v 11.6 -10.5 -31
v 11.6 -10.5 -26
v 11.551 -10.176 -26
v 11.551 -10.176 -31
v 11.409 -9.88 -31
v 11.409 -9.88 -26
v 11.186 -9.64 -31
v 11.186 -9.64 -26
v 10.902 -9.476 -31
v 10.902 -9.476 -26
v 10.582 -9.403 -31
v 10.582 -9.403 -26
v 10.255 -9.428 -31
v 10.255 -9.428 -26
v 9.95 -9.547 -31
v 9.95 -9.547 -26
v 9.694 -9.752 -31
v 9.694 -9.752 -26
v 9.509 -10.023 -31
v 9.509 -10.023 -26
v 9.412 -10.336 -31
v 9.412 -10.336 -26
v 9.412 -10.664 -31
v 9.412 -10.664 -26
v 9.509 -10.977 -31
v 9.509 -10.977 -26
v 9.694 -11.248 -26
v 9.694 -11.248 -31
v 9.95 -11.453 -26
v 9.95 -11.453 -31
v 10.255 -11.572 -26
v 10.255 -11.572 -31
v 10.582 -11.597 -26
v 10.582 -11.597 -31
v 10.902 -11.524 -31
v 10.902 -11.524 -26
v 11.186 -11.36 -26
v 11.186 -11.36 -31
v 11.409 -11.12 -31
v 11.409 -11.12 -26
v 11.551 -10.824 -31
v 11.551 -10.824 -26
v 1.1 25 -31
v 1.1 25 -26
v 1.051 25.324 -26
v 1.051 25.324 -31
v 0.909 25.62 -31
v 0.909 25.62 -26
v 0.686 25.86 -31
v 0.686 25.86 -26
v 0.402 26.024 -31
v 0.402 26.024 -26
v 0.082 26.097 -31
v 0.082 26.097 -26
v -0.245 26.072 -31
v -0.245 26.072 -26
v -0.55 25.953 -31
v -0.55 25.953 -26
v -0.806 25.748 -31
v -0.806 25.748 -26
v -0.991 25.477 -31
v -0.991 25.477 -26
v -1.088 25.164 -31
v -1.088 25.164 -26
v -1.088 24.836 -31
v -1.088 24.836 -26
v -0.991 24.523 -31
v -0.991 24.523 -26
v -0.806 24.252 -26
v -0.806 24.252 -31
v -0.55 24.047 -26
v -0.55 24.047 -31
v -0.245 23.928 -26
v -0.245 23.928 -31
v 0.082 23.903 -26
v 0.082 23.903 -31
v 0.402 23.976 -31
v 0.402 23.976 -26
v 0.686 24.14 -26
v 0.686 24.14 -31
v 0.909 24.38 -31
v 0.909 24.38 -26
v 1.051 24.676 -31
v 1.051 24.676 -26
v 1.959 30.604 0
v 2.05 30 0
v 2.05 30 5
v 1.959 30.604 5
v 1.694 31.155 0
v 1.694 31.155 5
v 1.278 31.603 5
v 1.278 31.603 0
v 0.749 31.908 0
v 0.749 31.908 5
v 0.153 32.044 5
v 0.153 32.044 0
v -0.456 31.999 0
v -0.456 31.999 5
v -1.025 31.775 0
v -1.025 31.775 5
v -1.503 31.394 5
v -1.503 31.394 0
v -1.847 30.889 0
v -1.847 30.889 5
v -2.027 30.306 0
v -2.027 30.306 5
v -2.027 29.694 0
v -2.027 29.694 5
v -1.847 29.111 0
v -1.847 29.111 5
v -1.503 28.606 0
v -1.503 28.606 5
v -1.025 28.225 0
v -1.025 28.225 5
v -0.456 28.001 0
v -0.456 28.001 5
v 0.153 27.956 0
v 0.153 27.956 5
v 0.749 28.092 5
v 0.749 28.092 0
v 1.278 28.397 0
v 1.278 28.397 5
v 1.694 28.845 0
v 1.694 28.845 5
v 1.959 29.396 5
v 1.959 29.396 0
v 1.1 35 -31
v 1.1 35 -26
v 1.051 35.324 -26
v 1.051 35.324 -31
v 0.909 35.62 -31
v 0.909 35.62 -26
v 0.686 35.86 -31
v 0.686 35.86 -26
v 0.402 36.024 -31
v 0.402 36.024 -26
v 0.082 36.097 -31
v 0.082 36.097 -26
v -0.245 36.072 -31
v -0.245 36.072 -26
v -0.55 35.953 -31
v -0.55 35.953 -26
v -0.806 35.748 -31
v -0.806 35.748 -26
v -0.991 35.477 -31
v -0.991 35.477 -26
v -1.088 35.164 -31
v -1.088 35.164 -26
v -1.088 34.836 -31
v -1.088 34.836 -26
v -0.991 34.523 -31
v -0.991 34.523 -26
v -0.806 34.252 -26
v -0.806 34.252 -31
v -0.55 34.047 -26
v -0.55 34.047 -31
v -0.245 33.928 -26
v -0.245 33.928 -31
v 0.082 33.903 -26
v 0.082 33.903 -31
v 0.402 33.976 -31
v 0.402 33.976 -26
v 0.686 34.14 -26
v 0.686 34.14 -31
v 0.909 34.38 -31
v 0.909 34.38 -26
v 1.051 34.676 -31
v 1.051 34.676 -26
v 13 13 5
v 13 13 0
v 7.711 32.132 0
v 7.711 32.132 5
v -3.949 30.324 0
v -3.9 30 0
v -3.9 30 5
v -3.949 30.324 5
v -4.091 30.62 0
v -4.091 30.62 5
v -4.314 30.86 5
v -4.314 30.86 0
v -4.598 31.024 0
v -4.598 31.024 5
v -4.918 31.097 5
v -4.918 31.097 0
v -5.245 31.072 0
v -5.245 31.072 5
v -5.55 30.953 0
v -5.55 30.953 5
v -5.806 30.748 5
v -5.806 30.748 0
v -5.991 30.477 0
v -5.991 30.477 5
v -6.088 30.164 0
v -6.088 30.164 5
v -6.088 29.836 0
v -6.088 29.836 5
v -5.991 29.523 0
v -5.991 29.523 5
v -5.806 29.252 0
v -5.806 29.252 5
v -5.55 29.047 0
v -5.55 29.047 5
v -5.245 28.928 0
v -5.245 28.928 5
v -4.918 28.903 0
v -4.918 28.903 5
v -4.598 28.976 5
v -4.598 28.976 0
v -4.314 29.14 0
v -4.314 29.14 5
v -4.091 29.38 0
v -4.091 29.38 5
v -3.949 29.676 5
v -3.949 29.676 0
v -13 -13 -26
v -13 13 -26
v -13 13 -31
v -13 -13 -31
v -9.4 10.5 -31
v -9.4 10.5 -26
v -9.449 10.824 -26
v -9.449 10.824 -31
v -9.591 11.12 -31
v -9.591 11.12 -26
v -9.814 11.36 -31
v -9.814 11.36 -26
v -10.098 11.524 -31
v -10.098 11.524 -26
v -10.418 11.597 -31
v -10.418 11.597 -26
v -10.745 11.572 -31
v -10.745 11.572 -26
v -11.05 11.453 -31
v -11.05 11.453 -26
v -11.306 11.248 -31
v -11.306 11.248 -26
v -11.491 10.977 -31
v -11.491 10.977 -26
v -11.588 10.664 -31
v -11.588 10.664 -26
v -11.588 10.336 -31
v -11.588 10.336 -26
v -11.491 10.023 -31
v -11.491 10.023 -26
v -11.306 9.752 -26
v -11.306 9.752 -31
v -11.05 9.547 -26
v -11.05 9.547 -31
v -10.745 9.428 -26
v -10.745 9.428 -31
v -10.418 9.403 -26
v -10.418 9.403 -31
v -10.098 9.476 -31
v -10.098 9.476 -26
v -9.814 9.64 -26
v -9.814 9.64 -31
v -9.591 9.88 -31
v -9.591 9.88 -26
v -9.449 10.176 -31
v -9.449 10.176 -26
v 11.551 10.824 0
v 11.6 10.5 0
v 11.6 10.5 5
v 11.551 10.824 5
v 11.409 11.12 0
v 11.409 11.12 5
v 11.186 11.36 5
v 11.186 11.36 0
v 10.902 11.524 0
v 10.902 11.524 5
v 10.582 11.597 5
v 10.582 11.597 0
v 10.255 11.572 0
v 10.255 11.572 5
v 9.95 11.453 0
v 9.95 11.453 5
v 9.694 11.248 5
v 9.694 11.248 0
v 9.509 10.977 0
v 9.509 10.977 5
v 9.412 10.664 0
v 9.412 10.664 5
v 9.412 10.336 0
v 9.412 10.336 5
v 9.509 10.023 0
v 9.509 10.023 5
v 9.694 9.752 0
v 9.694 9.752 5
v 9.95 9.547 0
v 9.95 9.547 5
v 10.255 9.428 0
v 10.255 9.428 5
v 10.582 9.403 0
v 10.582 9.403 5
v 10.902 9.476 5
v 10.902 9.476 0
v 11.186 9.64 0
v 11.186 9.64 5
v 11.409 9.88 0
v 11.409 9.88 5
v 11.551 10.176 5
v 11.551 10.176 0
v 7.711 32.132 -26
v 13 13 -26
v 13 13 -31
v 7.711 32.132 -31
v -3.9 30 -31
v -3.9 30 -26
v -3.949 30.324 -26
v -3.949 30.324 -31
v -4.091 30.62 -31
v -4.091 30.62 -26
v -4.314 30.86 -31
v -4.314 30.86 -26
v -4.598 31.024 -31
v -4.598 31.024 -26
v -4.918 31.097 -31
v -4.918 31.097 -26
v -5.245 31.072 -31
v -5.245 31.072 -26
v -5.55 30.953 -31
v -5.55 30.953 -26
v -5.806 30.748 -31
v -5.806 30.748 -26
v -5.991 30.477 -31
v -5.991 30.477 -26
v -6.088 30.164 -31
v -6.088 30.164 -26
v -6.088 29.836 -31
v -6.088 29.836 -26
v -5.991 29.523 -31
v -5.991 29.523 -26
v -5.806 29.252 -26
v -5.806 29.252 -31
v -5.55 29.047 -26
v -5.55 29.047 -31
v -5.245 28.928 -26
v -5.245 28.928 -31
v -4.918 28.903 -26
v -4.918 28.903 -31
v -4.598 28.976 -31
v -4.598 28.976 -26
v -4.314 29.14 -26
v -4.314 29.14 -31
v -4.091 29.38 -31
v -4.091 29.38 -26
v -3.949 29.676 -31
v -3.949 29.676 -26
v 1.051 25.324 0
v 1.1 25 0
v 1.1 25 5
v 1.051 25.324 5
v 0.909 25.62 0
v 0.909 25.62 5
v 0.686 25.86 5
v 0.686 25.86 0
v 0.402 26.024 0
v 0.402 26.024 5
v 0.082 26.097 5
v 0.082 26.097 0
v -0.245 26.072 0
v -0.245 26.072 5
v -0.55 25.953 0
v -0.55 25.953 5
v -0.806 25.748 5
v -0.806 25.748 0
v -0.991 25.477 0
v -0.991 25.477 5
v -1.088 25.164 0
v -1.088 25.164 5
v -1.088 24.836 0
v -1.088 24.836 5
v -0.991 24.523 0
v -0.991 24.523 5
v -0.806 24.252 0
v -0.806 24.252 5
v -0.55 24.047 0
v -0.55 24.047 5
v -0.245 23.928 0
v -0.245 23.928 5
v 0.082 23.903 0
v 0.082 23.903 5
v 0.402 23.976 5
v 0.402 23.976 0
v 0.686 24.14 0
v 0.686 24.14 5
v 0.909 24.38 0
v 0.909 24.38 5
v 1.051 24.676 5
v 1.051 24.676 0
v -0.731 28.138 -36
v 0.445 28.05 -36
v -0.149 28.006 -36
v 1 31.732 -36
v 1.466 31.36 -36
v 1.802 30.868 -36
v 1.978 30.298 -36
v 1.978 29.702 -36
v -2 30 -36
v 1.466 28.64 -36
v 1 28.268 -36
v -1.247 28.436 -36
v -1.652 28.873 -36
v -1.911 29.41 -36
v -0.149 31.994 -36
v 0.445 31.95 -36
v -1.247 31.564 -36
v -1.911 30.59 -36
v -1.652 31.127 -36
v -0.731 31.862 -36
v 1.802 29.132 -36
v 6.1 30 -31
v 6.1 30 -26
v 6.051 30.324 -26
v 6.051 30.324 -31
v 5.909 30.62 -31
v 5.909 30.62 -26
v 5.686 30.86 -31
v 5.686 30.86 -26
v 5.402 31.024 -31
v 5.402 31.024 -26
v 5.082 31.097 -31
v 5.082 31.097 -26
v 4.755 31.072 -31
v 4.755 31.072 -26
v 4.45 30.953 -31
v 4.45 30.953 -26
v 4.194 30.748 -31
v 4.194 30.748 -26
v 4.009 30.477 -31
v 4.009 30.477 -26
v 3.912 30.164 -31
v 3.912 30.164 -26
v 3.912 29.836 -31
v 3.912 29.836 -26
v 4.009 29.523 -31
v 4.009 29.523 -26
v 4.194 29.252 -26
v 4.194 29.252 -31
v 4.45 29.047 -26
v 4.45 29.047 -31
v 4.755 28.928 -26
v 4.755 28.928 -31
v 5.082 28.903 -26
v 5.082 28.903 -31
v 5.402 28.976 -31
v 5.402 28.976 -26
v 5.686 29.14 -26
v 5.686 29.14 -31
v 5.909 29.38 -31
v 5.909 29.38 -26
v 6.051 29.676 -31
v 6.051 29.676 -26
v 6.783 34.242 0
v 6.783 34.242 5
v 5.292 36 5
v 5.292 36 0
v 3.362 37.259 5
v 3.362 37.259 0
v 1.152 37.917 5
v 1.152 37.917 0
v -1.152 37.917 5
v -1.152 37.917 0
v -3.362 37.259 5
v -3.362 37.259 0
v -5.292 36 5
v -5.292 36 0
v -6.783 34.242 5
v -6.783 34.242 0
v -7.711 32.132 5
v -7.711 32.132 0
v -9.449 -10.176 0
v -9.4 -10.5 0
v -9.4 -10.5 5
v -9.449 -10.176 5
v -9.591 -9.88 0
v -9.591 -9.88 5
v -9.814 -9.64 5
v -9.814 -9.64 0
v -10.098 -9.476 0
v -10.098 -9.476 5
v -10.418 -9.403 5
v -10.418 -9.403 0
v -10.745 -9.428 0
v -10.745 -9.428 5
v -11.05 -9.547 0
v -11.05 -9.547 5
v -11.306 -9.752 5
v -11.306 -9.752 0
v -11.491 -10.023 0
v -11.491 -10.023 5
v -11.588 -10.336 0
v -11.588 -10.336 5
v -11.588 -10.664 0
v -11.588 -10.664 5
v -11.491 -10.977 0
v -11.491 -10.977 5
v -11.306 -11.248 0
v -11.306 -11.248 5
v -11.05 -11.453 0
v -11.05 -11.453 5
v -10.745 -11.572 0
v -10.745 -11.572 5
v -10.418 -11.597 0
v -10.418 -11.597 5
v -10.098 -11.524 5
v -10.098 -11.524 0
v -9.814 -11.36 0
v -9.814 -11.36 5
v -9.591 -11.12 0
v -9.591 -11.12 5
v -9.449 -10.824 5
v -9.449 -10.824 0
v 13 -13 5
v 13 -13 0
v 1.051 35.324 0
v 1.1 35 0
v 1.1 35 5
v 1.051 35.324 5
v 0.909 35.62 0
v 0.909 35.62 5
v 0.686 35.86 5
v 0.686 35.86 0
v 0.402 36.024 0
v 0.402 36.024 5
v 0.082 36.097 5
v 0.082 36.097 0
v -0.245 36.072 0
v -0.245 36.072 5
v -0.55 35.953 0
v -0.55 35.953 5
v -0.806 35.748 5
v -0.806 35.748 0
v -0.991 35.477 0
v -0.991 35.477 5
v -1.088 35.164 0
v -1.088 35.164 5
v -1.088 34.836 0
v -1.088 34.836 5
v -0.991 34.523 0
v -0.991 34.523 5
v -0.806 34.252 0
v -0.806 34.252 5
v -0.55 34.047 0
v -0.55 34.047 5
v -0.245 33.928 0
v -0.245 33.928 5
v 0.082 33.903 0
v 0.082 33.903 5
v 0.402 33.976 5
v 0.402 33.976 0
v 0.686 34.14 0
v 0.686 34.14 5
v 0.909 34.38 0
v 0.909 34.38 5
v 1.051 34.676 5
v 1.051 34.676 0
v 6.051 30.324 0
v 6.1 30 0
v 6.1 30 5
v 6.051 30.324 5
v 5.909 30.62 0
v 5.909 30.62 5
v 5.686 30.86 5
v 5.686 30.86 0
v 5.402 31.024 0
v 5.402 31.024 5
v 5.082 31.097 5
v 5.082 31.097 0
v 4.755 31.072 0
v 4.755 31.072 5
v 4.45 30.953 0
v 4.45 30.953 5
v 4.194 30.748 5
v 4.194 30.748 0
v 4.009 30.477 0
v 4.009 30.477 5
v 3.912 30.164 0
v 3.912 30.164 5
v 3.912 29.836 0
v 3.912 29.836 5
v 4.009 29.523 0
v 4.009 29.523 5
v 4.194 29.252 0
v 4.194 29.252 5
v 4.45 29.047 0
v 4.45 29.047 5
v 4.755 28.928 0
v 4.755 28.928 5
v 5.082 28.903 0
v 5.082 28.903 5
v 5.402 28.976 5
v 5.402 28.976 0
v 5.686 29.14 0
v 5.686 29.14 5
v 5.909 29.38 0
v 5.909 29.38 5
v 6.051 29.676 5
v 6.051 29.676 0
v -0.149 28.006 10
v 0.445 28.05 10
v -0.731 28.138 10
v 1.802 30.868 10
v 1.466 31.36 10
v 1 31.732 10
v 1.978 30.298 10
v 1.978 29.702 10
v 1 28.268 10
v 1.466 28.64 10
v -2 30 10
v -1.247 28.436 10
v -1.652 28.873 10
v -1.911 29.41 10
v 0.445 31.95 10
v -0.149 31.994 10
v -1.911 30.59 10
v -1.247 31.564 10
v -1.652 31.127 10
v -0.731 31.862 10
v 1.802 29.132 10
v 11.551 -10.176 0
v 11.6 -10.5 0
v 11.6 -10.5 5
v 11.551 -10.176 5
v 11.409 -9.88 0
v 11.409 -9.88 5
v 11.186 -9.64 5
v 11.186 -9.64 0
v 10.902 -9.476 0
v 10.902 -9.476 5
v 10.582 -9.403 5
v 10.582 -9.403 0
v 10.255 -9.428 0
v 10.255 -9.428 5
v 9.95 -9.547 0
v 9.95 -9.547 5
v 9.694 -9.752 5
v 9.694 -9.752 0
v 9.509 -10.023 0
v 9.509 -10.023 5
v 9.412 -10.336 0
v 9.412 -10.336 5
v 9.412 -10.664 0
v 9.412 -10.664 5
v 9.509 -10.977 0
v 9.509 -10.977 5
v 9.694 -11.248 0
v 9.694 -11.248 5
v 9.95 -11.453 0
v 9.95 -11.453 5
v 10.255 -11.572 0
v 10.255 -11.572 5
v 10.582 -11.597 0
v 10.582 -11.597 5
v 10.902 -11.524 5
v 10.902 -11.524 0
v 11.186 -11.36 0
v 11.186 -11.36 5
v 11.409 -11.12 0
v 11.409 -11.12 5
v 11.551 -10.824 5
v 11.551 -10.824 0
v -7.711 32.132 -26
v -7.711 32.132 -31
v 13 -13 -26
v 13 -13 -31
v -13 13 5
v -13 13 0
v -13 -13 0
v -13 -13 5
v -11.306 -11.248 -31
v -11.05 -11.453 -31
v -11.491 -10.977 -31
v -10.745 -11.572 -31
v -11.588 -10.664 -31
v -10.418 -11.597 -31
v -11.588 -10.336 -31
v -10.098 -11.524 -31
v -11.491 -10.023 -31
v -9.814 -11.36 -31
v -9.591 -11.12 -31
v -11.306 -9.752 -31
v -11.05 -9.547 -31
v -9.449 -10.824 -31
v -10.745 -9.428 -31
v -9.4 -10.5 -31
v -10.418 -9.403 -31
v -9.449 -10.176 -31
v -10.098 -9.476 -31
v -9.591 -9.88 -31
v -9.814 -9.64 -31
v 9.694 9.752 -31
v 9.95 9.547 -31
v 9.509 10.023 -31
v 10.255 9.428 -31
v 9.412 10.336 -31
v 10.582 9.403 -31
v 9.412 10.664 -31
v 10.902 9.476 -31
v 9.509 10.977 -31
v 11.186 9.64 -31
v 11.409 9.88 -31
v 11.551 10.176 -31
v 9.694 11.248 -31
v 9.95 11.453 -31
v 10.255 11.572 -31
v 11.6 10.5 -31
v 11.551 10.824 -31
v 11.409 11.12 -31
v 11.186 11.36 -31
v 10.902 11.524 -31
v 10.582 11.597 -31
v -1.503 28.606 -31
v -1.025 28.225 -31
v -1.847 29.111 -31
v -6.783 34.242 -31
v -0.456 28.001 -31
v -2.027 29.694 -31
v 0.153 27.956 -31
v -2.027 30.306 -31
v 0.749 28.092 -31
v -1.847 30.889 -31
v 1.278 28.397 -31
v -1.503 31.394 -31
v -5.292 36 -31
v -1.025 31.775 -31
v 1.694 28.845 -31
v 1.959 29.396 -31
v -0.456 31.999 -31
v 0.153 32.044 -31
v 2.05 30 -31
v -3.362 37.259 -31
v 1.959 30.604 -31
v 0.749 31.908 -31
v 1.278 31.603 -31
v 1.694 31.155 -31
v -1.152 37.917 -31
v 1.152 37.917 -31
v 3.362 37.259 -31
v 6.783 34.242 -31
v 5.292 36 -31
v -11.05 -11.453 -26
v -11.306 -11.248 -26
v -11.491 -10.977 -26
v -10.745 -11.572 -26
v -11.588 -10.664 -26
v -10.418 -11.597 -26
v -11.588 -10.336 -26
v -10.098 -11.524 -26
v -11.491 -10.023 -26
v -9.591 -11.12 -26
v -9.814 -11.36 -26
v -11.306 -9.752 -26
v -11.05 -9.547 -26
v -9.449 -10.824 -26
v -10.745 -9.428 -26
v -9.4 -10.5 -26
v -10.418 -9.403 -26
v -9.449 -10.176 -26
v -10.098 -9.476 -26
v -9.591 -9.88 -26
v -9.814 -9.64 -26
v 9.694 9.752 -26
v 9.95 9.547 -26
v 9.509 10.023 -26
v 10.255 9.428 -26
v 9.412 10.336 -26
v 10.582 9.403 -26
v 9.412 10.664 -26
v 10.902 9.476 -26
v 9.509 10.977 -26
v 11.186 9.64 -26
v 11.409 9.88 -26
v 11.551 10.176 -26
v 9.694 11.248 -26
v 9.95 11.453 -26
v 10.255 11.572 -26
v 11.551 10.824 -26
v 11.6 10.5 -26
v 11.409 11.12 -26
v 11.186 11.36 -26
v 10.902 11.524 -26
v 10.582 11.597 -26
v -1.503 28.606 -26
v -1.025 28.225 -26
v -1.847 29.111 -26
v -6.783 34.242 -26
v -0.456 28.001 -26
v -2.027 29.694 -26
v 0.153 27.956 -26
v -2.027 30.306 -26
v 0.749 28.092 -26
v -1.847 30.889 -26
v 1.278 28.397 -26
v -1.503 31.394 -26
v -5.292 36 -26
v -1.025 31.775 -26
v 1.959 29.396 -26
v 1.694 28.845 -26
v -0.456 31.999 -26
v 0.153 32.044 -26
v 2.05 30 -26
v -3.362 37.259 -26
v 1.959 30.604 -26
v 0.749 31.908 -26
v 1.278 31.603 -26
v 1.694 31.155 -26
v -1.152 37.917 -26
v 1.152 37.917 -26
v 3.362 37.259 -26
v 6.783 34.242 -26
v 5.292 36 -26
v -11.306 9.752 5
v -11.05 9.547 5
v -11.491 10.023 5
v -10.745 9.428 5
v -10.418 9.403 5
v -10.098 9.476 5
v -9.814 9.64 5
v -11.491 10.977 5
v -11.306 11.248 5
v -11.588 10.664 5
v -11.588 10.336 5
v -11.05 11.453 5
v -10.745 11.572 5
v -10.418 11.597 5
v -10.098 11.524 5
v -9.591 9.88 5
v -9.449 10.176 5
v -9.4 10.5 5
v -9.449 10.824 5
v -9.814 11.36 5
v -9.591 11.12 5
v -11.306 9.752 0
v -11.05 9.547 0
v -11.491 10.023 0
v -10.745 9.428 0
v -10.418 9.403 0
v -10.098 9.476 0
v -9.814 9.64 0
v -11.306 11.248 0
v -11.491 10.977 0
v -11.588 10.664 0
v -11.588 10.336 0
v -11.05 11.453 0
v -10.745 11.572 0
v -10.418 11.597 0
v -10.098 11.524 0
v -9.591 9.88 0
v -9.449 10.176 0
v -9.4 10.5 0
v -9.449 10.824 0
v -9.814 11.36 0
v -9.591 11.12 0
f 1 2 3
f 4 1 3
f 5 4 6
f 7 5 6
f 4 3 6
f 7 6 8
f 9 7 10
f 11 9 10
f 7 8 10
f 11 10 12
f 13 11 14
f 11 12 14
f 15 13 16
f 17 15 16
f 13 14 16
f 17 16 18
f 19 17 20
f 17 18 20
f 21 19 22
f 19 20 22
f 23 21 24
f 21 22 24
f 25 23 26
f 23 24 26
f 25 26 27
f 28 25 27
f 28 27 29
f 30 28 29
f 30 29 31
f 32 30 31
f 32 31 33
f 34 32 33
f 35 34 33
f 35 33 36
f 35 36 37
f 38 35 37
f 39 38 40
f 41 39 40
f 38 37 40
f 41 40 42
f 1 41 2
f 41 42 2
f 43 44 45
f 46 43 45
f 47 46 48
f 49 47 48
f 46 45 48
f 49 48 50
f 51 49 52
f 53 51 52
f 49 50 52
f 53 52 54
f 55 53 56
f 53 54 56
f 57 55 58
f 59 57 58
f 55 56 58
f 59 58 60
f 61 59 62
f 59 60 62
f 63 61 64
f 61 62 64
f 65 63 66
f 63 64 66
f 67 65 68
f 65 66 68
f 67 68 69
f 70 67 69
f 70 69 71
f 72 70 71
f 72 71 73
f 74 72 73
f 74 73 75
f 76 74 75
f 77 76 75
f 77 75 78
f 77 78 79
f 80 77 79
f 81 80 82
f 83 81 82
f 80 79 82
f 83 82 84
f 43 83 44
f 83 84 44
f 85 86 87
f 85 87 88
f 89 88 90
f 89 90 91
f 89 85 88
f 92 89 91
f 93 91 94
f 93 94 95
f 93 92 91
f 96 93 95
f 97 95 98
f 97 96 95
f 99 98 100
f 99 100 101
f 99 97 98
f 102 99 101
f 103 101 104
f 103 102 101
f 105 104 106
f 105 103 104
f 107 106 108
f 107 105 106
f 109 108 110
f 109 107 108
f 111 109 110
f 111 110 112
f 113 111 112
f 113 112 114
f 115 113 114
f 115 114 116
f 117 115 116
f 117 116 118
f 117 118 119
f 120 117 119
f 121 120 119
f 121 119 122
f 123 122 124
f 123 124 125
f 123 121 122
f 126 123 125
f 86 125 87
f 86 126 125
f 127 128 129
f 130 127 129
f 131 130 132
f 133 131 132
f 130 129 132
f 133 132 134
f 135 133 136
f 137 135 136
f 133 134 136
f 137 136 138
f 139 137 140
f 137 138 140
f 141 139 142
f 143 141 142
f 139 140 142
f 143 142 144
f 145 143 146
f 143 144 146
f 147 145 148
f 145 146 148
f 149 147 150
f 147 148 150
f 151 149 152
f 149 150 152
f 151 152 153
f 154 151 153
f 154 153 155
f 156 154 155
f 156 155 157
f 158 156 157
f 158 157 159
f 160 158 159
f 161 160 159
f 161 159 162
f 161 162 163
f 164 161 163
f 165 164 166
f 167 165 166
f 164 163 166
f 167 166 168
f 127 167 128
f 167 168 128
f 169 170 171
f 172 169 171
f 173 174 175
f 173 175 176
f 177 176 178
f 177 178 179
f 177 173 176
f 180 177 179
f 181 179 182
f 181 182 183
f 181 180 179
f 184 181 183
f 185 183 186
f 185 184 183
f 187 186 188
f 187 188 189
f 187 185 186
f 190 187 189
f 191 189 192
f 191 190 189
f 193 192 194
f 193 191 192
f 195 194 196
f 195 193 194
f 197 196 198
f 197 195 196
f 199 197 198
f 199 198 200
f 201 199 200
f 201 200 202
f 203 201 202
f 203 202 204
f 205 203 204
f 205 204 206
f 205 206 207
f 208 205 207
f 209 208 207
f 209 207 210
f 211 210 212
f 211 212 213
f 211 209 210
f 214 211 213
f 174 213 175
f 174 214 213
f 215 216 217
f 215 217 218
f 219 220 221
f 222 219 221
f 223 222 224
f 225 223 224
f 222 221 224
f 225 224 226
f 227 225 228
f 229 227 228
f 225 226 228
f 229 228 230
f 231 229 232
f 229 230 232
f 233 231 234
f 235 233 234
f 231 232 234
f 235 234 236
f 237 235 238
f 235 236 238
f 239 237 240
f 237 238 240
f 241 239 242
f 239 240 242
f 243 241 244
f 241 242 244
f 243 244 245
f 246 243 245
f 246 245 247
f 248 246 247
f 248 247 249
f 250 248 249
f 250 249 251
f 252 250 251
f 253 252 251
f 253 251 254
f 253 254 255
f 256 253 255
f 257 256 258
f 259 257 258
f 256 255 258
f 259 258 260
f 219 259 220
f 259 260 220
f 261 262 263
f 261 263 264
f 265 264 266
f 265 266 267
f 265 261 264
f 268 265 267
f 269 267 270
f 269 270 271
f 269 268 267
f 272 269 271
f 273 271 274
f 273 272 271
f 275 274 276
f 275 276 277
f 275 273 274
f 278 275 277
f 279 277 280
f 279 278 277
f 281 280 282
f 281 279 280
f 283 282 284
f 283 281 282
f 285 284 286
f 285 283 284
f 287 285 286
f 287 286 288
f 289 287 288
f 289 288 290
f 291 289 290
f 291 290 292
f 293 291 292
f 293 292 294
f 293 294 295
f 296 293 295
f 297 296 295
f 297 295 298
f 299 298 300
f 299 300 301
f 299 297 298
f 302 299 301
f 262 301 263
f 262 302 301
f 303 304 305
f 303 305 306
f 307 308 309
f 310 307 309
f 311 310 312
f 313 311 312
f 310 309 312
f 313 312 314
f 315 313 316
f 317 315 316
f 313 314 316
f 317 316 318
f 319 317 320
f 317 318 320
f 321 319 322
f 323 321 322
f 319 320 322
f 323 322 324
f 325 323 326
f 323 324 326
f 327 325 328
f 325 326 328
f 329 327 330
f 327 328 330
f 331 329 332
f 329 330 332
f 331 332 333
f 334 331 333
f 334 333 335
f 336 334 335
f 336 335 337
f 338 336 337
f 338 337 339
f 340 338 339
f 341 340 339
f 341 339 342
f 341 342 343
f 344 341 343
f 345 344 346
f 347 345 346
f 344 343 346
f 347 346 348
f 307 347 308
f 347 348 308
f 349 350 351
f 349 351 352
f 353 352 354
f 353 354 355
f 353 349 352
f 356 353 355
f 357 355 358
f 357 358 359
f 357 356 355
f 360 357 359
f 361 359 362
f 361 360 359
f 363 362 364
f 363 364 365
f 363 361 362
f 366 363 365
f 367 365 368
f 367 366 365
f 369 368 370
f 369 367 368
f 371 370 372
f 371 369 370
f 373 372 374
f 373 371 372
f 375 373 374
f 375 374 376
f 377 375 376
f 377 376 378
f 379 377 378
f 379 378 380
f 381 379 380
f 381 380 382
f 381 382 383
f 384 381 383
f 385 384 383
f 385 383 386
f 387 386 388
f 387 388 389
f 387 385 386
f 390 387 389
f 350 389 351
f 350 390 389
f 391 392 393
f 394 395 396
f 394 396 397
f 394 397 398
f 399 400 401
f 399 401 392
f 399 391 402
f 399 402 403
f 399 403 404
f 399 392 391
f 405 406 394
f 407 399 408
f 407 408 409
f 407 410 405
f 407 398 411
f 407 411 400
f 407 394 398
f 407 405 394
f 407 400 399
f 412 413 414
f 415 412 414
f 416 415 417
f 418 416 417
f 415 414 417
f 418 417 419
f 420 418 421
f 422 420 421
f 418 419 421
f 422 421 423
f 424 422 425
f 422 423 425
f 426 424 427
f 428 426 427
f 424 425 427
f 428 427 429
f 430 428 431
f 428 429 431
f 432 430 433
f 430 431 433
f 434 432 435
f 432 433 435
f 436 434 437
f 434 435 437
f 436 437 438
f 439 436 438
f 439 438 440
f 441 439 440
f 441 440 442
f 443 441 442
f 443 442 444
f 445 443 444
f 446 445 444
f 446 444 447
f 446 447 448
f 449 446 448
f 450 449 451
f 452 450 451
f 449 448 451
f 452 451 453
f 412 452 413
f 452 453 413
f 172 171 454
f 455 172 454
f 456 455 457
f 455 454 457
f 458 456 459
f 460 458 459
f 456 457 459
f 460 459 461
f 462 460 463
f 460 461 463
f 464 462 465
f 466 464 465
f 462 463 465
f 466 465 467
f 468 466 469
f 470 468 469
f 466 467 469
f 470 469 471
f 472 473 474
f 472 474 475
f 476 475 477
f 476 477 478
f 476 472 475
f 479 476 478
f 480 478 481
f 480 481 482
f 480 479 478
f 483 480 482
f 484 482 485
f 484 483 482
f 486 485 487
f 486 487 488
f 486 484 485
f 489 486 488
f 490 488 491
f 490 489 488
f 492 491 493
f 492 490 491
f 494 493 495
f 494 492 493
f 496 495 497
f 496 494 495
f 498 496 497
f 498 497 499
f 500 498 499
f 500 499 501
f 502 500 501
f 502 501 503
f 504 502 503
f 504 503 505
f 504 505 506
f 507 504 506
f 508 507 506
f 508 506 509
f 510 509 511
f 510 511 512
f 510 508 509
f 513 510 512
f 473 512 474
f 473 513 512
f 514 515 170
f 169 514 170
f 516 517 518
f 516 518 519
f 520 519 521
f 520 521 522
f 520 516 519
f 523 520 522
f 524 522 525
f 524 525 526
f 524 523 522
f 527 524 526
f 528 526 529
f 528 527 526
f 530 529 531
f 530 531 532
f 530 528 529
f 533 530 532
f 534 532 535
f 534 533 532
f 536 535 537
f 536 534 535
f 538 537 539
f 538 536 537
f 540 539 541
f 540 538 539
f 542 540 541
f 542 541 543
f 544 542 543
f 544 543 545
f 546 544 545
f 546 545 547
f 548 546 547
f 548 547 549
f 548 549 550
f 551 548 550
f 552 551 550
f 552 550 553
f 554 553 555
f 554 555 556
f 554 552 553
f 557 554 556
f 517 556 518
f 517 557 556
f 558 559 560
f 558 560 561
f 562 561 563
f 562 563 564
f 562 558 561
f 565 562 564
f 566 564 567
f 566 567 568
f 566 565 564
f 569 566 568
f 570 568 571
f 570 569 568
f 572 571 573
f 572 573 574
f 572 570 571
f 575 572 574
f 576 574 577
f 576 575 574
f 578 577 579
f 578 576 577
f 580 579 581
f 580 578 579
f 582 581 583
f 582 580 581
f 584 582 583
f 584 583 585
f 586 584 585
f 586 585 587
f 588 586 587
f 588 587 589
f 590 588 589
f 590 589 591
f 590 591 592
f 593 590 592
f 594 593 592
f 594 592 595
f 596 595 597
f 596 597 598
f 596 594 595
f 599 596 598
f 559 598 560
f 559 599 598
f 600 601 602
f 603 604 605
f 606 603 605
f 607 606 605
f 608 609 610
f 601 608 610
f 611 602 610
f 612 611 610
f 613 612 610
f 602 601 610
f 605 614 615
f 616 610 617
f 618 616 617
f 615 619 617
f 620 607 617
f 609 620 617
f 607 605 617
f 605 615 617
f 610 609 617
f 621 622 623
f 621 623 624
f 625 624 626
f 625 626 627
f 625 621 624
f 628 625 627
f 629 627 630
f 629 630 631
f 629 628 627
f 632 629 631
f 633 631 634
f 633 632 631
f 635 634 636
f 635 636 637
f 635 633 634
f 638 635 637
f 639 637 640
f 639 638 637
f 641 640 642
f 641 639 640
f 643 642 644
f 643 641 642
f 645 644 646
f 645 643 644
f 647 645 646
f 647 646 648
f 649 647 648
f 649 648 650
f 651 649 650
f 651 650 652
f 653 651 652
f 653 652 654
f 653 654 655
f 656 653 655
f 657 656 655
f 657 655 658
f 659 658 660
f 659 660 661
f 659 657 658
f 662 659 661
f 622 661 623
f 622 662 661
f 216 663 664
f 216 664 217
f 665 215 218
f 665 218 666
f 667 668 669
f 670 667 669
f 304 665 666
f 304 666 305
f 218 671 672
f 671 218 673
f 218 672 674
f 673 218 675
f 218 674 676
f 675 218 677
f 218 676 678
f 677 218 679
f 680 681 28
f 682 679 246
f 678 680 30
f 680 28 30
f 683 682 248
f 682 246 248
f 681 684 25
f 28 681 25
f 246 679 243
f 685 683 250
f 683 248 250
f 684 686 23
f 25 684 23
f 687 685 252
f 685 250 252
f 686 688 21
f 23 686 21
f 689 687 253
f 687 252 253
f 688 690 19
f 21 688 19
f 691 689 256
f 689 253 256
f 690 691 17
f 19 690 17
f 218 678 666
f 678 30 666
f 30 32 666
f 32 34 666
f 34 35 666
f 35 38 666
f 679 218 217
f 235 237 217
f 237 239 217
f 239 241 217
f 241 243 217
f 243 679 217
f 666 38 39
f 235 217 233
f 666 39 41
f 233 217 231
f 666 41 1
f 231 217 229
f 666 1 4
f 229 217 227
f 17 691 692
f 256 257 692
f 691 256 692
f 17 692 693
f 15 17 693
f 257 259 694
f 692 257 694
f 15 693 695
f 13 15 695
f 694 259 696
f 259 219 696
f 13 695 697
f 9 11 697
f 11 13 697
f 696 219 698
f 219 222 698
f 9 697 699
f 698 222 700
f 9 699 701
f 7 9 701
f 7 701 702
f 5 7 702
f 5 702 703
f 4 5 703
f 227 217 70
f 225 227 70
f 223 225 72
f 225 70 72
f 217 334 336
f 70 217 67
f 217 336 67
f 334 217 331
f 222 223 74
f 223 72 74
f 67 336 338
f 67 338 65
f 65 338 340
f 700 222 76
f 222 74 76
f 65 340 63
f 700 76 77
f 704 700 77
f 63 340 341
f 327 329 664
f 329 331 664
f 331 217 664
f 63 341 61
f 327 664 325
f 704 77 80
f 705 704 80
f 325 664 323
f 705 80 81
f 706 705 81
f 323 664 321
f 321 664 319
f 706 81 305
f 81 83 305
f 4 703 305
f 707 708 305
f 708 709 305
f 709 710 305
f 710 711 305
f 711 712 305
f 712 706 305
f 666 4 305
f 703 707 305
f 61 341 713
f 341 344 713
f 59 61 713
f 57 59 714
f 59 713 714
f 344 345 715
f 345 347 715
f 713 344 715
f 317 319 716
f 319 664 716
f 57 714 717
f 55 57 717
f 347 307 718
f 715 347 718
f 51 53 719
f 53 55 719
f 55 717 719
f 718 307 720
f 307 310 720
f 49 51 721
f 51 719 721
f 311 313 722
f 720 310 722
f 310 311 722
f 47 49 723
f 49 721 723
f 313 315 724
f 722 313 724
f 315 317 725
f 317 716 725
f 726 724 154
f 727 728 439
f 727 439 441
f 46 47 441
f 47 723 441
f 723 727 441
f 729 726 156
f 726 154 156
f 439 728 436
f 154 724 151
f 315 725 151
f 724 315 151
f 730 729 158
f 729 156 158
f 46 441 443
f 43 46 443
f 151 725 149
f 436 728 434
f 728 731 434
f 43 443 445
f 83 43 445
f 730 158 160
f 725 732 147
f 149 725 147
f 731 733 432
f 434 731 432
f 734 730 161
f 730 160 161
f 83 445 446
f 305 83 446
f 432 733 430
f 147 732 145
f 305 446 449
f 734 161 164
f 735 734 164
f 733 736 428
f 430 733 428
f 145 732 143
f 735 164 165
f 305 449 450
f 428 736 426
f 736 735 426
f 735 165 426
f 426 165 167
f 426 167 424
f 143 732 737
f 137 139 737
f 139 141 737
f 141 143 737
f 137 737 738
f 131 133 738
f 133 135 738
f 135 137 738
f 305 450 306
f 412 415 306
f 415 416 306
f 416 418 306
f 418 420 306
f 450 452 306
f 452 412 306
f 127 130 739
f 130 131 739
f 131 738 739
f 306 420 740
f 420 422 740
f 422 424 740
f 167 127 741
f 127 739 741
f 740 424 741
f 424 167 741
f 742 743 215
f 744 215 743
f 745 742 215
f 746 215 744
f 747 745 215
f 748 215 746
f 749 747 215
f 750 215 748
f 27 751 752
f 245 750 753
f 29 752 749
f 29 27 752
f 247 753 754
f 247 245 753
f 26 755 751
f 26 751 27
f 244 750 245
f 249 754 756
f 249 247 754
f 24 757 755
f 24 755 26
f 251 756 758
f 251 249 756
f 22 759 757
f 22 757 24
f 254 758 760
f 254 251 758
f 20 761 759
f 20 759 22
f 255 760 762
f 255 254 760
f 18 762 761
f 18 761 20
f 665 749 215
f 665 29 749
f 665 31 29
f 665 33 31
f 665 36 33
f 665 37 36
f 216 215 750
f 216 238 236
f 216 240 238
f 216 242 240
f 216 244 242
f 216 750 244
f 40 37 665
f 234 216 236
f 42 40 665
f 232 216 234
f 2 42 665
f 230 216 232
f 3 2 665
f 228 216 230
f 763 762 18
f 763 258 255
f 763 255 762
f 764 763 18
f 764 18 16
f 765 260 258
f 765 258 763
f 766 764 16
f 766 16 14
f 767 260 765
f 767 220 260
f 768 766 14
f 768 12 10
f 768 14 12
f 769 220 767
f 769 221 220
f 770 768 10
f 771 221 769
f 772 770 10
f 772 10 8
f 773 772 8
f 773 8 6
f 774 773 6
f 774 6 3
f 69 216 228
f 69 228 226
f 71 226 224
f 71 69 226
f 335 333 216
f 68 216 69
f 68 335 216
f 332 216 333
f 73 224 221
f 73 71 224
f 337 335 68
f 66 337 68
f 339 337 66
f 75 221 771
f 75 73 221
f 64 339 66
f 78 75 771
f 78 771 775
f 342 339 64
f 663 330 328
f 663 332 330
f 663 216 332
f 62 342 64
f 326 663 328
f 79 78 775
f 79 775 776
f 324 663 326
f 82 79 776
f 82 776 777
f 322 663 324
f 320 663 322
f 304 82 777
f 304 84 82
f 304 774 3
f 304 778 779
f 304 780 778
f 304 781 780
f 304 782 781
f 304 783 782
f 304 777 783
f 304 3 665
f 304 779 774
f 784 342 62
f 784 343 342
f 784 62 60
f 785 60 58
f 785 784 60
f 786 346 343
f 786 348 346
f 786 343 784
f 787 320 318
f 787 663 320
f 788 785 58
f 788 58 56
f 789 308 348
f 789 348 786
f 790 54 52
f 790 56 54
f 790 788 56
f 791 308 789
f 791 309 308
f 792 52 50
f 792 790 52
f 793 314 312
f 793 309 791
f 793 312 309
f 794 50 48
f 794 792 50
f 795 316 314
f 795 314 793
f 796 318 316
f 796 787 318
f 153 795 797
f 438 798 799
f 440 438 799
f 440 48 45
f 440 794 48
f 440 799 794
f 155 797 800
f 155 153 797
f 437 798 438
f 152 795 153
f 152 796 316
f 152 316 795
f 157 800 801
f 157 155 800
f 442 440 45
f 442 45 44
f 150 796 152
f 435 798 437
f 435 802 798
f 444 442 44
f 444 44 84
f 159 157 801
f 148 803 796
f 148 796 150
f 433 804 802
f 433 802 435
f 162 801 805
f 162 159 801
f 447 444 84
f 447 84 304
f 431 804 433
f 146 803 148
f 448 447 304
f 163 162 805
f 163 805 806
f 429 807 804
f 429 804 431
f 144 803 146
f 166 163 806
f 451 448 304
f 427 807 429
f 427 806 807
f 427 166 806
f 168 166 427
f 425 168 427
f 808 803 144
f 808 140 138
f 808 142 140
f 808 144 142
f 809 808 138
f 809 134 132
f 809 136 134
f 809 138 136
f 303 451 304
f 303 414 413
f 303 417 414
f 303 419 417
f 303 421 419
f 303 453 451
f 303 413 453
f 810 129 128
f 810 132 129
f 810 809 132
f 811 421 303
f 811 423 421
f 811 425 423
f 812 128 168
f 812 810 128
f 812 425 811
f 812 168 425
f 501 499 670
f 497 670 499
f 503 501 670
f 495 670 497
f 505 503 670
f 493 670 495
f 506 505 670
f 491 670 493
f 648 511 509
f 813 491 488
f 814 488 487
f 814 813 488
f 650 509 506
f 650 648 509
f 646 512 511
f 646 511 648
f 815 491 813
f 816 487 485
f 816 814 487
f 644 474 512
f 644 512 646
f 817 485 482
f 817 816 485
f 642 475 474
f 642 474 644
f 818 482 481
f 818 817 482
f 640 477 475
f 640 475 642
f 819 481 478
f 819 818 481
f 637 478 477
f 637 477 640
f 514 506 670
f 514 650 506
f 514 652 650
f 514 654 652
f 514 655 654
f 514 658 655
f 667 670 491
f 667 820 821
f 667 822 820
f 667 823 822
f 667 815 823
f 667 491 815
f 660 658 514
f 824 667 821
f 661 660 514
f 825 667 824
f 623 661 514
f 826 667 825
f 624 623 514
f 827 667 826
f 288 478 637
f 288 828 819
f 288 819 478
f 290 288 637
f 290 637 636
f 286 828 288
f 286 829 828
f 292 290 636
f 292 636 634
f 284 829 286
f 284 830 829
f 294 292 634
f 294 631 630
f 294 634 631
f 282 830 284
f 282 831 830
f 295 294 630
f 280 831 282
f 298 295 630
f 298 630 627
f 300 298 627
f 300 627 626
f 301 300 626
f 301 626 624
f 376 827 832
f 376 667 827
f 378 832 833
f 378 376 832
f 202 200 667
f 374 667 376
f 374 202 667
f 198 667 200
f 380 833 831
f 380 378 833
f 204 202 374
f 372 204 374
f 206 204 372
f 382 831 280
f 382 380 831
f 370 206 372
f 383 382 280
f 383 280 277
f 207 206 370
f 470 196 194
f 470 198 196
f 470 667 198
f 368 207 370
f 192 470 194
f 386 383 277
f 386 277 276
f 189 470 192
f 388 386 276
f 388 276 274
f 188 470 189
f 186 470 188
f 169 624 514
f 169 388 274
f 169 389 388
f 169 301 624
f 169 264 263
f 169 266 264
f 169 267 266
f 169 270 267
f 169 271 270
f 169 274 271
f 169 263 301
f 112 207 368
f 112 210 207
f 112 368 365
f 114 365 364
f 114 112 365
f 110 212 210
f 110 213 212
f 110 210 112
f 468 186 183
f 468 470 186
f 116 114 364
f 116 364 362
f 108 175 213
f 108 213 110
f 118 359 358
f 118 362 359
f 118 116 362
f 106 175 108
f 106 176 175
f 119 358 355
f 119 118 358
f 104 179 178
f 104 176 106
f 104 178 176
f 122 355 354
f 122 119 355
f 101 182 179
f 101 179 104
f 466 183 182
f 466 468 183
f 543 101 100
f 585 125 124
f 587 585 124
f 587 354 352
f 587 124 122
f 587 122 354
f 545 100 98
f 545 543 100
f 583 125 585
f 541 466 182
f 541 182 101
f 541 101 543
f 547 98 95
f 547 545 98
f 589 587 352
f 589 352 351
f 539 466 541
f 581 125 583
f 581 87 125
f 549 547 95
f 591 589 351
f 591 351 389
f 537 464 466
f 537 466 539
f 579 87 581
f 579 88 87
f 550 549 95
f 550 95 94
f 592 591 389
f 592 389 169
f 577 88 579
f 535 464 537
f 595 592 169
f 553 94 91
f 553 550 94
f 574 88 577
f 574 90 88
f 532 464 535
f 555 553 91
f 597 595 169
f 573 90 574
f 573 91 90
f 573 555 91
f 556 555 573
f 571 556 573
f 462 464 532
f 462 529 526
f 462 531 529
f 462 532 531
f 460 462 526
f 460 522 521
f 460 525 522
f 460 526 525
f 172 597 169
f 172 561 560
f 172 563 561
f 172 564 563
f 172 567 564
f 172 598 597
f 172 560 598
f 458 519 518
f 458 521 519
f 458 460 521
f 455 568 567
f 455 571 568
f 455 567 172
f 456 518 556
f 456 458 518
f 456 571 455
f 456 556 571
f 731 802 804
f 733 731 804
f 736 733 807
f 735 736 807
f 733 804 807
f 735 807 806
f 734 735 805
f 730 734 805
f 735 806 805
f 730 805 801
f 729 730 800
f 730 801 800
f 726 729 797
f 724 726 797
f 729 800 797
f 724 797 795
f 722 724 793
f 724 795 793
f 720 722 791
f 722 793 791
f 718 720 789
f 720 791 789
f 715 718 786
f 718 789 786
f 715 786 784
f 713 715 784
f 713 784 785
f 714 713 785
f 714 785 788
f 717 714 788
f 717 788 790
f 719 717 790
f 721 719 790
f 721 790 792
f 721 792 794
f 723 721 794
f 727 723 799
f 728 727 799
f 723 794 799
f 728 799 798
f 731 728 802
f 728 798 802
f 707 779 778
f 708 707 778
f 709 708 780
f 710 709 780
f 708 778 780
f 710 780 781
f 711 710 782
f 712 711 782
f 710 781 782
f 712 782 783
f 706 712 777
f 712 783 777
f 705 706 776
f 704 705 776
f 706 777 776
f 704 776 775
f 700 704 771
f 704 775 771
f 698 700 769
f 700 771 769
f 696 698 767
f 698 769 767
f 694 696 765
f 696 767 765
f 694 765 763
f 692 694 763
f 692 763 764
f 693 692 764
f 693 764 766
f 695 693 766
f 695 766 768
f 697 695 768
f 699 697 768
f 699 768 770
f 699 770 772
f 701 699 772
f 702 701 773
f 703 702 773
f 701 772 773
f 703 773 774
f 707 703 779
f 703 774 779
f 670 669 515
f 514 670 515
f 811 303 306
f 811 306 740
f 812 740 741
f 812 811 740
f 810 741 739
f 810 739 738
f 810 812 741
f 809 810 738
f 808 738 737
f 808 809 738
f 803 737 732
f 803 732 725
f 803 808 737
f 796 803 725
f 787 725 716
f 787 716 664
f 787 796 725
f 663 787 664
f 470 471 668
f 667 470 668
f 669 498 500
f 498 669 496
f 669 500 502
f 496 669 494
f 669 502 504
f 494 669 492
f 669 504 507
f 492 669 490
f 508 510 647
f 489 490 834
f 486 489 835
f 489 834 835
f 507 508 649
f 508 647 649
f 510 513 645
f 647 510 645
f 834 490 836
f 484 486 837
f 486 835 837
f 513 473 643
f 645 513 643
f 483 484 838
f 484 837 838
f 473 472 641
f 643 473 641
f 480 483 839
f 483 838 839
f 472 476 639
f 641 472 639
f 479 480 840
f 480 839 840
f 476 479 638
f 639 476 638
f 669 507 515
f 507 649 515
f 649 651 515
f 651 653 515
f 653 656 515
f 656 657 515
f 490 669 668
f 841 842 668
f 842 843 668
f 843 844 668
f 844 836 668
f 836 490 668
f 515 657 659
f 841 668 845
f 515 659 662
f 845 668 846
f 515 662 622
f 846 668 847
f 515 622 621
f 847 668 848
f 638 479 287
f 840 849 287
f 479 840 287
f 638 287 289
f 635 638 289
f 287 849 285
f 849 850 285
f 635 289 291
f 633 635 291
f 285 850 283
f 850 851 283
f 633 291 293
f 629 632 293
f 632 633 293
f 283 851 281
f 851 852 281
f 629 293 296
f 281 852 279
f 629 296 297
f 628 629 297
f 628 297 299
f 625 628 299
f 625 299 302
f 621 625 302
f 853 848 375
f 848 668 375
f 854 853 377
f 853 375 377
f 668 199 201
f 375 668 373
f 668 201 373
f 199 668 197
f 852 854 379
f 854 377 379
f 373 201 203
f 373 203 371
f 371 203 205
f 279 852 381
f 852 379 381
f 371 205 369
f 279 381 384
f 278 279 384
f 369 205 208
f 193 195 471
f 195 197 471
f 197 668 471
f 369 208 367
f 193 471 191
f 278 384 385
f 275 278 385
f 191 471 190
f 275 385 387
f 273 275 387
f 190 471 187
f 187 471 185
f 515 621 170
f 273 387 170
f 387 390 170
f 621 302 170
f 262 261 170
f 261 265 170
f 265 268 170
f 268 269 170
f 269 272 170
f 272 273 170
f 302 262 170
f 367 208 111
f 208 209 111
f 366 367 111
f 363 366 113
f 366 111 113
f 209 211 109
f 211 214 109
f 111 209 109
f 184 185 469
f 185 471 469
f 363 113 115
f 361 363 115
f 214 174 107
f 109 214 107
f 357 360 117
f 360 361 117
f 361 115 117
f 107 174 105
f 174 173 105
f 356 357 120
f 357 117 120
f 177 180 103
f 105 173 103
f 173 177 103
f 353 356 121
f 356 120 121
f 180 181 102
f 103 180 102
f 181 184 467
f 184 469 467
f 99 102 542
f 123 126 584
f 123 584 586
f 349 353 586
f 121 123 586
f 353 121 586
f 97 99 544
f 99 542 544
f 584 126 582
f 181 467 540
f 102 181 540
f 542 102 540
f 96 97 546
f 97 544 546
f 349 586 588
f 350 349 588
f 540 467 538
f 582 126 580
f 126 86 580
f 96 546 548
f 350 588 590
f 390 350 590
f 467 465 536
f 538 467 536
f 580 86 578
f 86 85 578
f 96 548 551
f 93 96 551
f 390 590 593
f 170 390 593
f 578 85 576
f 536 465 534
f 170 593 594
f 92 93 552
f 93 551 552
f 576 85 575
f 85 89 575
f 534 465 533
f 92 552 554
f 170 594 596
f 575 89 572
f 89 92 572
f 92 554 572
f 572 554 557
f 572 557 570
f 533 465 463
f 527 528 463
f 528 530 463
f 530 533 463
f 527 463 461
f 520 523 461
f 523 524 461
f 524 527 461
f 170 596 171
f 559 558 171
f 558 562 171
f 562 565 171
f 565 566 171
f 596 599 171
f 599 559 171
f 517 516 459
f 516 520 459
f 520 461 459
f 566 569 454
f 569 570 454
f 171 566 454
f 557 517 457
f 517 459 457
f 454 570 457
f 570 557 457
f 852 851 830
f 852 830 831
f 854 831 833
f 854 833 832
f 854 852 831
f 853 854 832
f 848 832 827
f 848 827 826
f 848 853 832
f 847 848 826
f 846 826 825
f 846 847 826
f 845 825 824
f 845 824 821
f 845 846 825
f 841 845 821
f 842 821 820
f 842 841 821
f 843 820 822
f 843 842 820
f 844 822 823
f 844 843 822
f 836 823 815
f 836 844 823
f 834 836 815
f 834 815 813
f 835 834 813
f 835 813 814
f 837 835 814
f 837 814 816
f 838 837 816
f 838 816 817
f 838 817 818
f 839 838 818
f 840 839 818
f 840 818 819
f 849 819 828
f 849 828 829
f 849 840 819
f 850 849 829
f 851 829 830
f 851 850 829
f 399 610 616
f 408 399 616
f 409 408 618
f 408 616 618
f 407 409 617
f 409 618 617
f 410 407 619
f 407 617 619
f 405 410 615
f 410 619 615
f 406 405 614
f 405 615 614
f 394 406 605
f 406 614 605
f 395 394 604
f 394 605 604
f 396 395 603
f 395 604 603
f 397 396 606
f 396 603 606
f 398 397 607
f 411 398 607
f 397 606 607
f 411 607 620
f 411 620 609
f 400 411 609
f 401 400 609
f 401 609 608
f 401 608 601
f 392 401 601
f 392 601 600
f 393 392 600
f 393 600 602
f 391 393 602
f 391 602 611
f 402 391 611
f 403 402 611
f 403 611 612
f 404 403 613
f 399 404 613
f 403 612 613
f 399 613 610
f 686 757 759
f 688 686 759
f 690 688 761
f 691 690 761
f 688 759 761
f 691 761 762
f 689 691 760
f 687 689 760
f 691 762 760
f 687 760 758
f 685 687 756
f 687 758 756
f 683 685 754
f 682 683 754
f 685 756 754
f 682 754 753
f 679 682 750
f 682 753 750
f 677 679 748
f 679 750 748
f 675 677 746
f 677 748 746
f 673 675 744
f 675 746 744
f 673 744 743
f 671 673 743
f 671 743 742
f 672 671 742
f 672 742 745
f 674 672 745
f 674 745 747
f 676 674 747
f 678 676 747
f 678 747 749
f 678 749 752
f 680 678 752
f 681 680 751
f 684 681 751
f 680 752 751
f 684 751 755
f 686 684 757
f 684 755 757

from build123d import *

# Parameters (mm, degrees)
SKETCH_1_R           = 1.1
SKETCH_1_R_2         = 2.05
EXTRUDE_1_DEPTH      = 5
SKETCH_4_R           = 1.1
SKETCH_4_R_2         = 2.05
EXTRUDE_2_DEPTH      = 5
EXTRUDE_3_DEPTH      = 5
EXTRUDE_3_DEPTH_BACK = 41
SKETCH_6_R           = 2


with BuildPart() as part:
    # ｽｹｯﾁ1 → ﾎﾞｽ - 押し出し1 (new body)
    with BuildSketch(Plane.XY):
        with BuildLine():
            Line((-13, -13), (13, -13))
            Line((13, -13), (13, 13))
            Line((13, 13), (7.710748735, 32.131749033))
            ThreePointArc((7.710748735, 32.131749033), (0, 38), (-7.710748735, 32.131749033))
            Line((-7.710748735, 32.131749033), (-13, 13))
            Line((-13, 13), (-13, -13))
        make_face()
        with Locations((-10.5, 10.5)):
            Circle(SKETCH_1_R, mode=Mode.SUBTRACT)
        with Locations((10.5, 10.5)):
            Circle(SKETCH_1_R, mode=Mode.SUBTRACT)
        with Locations((10.5, -10.5)):
            Circle(SKETCH_1_R, mode=Mode.SUBTRACT)
        with Locations((-10.5, -10.5)):
            Circle(SKETCH_1_R, mode=Mode.SUBTRACT)
        with Locations((0, 30)):
            Circle(SKETCH_1_R_2, mode=Mode.SUBTRACT)
        with Locations((0, 35)):
            Circle(SKETCH_1_R, mode=Mode.SUBTRACT)
        with Locations((5, 30)):
            Circle(SKETCH_1_R, mode=Mode.SUBTRACT)
        with Locations((0, 25)):
            Circle(SKETCH_1_R, mode=Mode.SUBTRACT)
        with Locations((-5, 30)):
            Circle(SKETCH_1_R, mode=Mode.SUBTRACT)
    extrude(amount=EXTRUDE_1_DEPTH)


with BuildPart() as body_2:
    # ｽｹｯﾁ4 → ﾎﾞｽ - 押し出し2 (new body)
    with BuildSketch(Plane.XY.offset(-26)):
        with BuildLine():
            Line((-13, 13), (-13, -13))
            Line((-13, -13), (13, -13))
            Line((13, -13), (13, 13))
            Line((13, 13), (7.710748735, 32.131749033))
            ThreePointArc((7.710748735, 32.131749033), (0, 38), (-7.710748735, 32.131749033))
            Line((-7.710748735, 32.131749033), (-13, 13))
        make_face()
        with Locations((-10.5, 10.5)):
            Circle(SKETCH_4_R, mode=Mode.SUBTRACT)
        with Locations((10.5, 10.5)):
            Circle(SKETCH_4_R, mode=Mode.SUBTRACT)
        with Locations((10.5, -10.5)):
            Circle(SKETCH_4_R, mode=Mode.SUBTRACT)
        with Locations((-10.5, -10.5)):
            Circle(SKETCH_4_R, mode=Mode.SUBTRACT)
        with Locations((0, 30)):
            Circle(SKETCH_4_R_2, mode=Mode.SUBTRACT)
        with Locations((0, 35)):
            Circle(SKETCH_4_R, mode=Mode.SUBTRACT)
        with Locations((5, 30)):
            Circle(SKETCH_4_R, mode=Mode.SUBTRACT)
        with Locations((0, 25)):
            Circle(SKETCH_4_R, mode=Mode.SUBTRACT)
        with Locations((-5, 30)):
            Circle(SKETCH_4_R, mode=Mode.SUBTRACT)
    extrude(amount=-EXTRUDE_2_DEPTH)


with BuildPart() as body_3:
    # ｽｹｯﾁ6 → ﾎﾞｽ - 押し出し3 (new, two sides: drawn at the far end of the back side and taken through both)
    with BuildSketch(Plane(origin=(0, 0, -31), x_dir=(-1, 0, 0), z_dir=(0, 0, -1)).offset(-EXTRUDE_3_DEPTH_BACK)):
        with Locations((0, 30)):
            Circle(SKETCH_6_R)
    extrude(amount=EXTRUDE_3_DEPTH + EXTRUDE_3_DEPTH_BACK)


solid = Compound([part.part, body_2.part, body_3.part])
